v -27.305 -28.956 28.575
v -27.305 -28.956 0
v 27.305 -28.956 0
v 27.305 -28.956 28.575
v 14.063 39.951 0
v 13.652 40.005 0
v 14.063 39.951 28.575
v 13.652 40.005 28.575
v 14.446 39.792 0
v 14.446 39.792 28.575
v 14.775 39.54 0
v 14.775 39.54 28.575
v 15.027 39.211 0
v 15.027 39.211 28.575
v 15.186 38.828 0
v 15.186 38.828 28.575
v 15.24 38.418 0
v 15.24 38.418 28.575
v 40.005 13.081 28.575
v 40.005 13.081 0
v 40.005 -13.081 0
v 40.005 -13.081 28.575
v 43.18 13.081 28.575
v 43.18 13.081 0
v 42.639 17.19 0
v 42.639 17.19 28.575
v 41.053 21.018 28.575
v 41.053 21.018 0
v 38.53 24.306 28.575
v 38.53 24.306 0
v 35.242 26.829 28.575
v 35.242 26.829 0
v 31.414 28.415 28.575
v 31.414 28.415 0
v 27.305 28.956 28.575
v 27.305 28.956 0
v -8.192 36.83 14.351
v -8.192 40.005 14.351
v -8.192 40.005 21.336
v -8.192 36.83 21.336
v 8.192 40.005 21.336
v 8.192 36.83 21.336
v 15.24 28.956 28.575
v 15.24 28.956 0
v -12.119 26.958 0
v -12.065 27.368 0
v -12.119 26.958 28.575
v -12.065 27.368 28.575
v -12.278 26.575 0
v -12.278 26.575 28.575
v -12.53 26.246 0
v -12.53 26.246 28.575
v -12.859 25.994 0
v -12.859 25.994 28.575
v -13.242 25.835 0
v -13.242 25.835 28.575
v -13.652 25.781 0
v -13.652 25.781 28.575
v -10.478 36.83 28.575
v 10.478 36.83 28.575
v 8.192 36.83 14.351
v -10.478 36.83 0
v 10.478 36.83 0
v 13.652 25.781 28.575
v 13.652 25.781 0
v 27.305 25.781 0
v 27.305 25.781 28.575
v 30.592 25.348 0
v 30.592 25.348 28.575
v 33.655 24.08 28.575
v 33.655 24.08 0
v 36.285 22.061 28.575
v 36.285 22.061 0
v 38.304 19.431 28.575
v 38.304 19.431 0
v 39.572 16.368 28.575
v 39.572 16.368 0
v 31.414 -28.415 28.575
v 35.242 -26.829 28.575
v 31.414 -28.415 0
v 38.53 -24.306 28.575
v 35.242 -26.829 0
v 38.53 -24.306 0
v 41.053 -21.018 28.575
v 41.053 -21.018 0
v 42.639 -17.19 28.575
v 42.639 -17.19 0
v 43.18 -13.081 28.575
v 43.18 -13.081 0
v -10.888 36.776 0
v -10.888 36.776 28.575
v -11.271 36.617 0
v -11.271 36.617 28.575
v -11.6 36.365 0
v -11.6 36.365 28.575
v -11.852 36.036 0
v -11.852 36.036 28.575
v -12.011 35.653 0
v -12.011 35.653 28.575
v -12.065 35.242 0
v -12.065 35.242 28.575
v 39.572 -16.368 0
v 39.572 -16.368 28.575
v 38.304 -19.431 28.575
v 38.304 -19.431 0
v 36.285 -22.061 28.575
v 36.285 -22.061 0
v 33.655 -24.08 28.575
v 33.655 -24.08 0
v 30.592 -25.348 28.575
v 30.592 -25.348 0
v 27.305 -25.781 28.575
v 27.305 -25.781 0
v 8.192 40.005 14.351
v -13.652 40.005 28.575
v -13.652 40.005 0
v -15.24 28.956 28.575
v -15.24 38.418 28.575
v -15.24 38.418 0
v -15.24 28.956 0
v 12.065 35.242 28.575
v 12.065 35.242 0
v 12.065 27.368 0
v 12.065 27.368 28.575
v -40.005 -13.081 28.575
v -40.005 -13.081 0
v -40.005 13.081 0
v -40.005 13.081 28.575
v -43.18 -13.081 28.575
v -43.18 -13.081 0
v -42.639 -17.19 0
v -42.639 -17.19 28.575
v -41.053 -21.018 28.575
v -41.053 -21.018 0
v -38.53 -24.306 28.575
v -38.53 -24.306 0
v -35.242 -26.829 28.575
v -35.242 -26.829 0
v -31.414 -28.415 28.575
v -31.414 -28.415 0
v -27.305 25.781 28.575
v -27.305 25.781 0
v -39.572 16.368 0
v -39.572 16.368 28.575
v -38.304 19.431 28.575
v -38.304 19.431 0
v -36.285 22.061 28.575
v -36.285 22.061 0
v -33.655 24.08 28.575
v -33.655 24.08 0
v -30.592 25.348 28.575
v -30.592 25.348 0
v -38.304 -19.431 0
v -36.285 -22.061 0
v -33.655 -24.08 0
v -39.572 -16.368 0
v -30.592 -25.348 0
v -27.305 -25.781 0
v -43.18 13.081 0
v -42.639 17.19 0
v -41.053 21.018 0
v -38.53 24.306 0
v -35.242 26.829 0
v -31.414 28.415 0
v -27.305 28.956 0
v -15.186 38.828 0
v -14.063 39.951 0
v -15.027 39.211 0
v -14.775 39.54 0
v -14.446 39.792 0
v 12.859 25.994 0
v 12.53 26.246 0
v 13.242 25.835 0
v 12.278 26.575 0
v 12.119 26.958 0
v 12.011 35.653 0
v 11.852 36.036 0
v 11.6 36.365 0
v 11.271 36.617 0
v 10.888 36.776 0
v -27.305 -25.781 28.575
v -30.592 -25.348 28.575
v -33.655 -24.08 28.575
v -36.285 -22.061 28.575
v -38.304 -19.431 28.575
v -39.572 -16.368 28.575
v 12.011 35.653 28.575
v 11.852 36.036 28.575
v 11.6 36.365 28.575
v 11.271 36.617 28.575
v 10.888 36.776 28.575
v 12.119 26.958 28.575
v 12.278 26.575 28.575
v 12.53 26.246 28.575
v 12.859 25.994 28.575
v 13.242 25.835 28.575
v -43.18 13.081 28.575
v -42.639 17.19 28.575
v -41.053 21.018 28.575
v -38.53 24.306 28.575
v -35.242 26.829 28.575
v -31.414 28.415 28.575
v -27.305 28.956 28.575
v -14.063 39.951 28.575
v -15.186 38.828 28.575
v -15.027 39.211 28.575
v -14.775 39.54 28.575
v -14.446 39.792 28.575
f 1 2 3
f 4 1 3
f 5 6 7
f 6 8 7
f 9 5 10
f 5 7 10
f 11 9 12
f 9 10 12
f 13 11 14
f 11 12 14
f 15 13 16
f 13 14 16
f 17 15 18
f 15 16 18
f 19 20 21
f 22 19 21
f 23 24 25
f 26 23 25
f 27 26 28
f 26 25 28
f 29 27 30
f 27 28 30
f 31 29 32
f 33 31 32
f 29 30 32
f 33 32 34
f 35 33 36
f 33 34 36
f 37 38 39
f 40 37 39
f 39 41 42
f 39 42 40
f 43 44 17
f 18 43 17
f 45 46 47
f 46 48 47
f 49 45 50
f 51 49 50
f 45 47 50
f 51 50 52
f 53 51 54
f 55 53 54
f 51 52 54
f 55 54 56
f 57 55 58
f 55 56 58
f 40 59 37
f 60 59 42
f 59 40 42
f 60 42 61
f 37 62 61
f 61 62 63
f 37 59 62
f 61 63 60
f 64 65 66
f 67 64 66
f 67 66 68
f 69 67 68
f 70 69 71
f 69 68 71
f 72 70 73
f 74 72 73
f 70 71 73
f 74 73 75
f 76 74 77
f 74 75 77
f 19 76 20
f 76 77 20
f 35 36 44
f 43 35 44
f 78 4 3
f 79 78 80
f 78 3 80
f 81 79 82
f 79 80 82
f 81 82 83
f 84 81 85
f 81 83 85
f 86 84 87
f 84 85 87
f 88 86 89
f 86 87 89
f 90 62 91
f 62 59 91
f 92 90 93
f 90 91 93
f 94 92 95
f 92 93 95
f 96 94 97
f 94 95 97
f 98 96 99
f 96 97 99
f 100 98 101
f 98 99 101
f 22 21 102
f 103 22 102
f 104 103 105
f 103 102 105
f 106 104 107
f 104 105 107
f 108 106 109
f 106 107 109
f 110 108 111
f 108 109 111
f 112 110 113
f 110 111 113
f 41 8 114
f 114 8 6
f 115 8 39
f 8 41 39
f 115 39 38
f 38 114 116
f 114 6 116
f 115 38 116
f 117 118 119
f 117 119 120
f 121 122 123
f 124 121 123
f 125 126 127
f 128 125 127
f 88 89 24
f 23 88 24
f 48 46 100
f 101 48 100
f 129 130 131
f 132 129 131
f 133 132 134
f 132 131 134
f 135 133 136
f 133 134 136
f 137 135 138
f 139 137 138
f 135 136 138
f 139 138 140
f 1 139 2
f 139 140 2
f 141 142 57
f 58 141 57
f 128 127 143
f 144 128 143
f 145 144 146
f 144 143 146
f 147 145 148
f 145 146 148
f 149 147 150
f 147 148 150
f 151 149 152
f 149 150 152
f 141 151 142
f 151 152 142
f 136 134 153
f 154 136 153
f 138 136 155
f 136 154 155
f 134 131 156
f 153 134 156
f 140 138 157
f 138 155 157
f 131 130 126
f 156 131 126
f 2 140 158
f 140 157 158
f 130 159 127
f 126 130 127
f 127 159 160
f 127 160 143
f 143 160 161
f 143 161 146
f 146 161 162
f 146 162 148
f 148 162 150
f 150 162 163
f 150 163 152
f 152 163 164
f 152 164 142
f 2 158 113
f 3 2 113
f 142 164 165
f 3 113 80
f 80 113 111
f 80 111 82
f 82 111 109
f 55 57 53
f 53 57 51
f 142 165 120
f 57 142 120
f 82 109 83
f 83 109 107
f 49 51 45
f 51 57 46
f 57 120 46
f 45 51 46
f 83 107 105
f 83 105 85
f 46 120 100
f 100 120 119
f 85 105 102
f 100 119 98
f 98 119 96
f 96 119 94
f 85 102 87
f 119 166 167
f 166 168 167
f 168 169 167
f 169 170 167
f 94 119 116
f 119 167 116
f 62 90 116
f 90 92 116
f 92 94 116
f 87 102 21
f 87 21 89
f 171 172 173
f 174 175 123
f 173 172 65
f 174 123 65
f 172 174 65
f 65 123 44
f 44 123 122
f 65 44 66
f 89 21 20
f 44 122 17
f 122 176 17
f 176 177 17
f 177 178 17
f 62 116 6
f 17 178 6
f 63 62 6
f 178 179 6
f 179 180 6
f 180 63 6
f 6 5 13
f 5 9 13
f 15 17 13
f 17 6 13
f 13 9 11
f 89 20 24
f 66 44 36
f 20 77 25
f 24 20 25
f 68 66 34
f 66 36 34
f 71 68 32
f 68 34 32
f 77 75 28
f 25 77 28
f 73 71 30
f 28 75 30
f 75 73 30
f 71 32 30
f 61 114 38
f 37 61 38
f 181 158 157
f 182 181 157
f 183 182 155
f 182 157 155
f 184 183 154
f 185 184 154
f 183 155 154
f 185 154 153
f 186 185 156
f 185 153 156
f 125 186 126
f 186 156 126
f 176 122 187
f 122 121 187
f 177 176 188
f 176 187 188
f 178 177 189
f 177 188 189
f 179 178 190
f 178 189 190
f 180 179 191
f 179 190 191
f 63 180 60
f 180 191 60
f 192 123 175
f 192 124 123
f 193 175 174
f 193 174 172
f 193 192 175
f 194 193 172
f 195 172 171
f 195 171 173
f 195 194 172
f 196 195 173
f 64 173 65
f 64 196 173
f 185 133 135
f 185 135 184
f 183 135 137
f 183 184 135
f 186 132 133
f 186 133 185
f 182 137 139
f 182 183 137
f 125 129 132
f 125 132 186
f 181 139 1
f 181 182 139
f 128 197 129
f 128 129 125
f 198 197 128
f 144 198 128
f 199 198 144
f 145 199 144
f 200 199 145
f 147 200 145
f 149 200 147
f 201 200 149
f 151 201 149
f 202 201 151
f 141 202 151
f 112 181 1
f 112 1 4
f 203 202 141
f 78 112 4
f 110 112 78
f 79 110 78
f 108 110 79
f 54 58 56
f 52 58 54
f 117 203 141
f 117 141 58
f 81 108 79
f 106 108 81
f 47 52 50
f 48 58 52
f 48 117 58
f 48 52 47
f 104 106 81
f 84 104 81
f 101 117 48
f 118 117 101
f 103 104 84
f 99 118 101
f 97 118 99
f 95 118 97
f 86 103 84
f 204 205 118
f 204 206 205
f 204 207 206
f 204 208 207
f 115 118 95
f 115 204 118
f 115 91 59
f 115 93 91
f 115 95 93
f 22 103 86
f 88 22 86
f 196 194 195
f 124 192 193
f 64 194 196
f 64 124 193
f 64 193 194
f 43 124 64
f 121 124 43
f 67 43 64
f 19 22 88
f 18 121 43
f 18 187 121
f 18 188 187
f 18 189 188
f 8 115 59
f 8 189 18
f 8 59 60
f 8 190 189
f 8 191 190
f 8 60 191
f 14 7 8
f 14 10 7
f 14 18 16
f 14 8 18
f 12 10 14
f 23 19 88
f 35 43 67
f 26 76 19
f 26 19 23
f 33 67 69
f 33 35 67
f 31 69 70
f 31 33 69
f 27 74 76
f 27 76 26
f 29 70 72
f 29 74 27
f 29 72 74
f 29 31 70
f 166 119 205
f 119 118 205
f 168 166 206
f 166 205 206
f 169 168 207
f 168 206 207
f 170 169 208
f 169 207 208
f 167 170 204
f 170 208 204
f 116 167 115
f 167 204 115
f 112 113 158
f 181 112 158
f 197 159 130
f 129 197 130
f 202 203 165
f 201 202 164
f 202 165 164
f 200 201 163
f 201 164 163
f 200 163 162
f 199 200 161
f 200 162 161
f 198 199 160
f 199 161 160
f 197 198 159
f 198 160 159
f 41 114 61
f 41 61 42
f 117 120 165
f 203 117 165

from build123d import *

# Parameters (mm, degrees)
F1_DEPTH = 28.575
F2_W     = 16.383
F2_H     = 6.985
F3_DEPTH = 3.175
F4_R     = 1.5875


with BuildPart() as f1:
    # F0 (on Top) → F1 (new body)
    with BuildSketch(Plane.XY):
        with BuildLine():
            Line((-15.24, 40.005), (-15.24, 28.956))
            Line((-15.24, 28.956), (-27.305, 28.956))
            ThreePointArc((-27.305, 28.956), (-38.53032, 24.30632), (-43.18, 13.081))
            Line((-43.18, 13.081), (-43.18, -13.081))
            ThreePointArc((-43.18, -13.081), (-38.53032, -24.30632), (-27.305, -28.956))
            Line((-27.305, -28.956), (27.305, -28.956))
            ThreePointArc((27.305, -28.956), (38.53032, -24.30632), (43.18, -13.081))
            Line((43.18, -13.081), (43.18, 13.081))
            ThreePointArc((43.18, 13.081), (38.53032, 24.30632), (27.305, 28.956))
            Line((27.305, 28.956), (15.24, 28.956))
            Line((15.24, 28.956), (15.24, 40.005))
            Line((15.24, 40.005), (-15.24, 40.005))
        make_face()
        with BuildLine():
            Line((12.065, 25.781), (27.305, 25.781))
            ThreePointArc((27.305, 25.781), (36.285256, 22.061256), (40.005, 13.081))
            Line((40.005, 13.081), (40.005, -13.081))
            ThreePointArc((40.005, -13.081), (36.285256, -22.061256), (27.305, -25.781))
            Line((27.305, -25.781), (-27.305, -25.781))
            ThreePointArc((-27.305, -25.781), (-36.285256, -22.061256), (-40.005, -13.081))
            Line((-40.005, -13.081), (-40.005, 13.081))
            ThreePointArc((-40.005, 13.081), (-36.285256, 22.061256), (-27.305, 25.781))
            Line((-27.305, 25.781), (-12.065, 25.781))
            Line((-12.065, 25.781), (-12.065, 36.83))
            Line((-12.065, 36.83), (12.065, 36.83))
            Line((12.065, 36.83), (12.065, 25.781))
        make_face(mode=Mode.SUBTRACT)
    extrude(amount=F1_DEPTH)

    # F2 (on face) → F3 (cut, through all)
    with BuildSketch(Plane(origin=(0, 40.005, 0), x_dir=(-1, 0, 0), z_dir=(0, 1, 0))):
        with Locations((0, 17.8435)):
            Rectangle(F2_W, F2_H)
    extrude(amount=-F3_DEPTH, mode=Mode.SUBTRACT)

    # F4
    f4_edges = [f1.edges().sort_by_distance(p)[0] for p in [
        (-12.065, 25.781, 14.2875),
        (-12.065, 36.83, 14.2875),
        (12.065, 25.781, 14.2875),
        (12.065, 36.83, 14.2875),
        (15.24, 40.005, 14.2875),
        (-15.24, 40.005, 14.2875),
    ]]
    fillet(f4_edges, radius=F4_R)


with BuildPart() as f5_1:
    # F5: copy of F1
    add(f1.part)


solid = f1.part
